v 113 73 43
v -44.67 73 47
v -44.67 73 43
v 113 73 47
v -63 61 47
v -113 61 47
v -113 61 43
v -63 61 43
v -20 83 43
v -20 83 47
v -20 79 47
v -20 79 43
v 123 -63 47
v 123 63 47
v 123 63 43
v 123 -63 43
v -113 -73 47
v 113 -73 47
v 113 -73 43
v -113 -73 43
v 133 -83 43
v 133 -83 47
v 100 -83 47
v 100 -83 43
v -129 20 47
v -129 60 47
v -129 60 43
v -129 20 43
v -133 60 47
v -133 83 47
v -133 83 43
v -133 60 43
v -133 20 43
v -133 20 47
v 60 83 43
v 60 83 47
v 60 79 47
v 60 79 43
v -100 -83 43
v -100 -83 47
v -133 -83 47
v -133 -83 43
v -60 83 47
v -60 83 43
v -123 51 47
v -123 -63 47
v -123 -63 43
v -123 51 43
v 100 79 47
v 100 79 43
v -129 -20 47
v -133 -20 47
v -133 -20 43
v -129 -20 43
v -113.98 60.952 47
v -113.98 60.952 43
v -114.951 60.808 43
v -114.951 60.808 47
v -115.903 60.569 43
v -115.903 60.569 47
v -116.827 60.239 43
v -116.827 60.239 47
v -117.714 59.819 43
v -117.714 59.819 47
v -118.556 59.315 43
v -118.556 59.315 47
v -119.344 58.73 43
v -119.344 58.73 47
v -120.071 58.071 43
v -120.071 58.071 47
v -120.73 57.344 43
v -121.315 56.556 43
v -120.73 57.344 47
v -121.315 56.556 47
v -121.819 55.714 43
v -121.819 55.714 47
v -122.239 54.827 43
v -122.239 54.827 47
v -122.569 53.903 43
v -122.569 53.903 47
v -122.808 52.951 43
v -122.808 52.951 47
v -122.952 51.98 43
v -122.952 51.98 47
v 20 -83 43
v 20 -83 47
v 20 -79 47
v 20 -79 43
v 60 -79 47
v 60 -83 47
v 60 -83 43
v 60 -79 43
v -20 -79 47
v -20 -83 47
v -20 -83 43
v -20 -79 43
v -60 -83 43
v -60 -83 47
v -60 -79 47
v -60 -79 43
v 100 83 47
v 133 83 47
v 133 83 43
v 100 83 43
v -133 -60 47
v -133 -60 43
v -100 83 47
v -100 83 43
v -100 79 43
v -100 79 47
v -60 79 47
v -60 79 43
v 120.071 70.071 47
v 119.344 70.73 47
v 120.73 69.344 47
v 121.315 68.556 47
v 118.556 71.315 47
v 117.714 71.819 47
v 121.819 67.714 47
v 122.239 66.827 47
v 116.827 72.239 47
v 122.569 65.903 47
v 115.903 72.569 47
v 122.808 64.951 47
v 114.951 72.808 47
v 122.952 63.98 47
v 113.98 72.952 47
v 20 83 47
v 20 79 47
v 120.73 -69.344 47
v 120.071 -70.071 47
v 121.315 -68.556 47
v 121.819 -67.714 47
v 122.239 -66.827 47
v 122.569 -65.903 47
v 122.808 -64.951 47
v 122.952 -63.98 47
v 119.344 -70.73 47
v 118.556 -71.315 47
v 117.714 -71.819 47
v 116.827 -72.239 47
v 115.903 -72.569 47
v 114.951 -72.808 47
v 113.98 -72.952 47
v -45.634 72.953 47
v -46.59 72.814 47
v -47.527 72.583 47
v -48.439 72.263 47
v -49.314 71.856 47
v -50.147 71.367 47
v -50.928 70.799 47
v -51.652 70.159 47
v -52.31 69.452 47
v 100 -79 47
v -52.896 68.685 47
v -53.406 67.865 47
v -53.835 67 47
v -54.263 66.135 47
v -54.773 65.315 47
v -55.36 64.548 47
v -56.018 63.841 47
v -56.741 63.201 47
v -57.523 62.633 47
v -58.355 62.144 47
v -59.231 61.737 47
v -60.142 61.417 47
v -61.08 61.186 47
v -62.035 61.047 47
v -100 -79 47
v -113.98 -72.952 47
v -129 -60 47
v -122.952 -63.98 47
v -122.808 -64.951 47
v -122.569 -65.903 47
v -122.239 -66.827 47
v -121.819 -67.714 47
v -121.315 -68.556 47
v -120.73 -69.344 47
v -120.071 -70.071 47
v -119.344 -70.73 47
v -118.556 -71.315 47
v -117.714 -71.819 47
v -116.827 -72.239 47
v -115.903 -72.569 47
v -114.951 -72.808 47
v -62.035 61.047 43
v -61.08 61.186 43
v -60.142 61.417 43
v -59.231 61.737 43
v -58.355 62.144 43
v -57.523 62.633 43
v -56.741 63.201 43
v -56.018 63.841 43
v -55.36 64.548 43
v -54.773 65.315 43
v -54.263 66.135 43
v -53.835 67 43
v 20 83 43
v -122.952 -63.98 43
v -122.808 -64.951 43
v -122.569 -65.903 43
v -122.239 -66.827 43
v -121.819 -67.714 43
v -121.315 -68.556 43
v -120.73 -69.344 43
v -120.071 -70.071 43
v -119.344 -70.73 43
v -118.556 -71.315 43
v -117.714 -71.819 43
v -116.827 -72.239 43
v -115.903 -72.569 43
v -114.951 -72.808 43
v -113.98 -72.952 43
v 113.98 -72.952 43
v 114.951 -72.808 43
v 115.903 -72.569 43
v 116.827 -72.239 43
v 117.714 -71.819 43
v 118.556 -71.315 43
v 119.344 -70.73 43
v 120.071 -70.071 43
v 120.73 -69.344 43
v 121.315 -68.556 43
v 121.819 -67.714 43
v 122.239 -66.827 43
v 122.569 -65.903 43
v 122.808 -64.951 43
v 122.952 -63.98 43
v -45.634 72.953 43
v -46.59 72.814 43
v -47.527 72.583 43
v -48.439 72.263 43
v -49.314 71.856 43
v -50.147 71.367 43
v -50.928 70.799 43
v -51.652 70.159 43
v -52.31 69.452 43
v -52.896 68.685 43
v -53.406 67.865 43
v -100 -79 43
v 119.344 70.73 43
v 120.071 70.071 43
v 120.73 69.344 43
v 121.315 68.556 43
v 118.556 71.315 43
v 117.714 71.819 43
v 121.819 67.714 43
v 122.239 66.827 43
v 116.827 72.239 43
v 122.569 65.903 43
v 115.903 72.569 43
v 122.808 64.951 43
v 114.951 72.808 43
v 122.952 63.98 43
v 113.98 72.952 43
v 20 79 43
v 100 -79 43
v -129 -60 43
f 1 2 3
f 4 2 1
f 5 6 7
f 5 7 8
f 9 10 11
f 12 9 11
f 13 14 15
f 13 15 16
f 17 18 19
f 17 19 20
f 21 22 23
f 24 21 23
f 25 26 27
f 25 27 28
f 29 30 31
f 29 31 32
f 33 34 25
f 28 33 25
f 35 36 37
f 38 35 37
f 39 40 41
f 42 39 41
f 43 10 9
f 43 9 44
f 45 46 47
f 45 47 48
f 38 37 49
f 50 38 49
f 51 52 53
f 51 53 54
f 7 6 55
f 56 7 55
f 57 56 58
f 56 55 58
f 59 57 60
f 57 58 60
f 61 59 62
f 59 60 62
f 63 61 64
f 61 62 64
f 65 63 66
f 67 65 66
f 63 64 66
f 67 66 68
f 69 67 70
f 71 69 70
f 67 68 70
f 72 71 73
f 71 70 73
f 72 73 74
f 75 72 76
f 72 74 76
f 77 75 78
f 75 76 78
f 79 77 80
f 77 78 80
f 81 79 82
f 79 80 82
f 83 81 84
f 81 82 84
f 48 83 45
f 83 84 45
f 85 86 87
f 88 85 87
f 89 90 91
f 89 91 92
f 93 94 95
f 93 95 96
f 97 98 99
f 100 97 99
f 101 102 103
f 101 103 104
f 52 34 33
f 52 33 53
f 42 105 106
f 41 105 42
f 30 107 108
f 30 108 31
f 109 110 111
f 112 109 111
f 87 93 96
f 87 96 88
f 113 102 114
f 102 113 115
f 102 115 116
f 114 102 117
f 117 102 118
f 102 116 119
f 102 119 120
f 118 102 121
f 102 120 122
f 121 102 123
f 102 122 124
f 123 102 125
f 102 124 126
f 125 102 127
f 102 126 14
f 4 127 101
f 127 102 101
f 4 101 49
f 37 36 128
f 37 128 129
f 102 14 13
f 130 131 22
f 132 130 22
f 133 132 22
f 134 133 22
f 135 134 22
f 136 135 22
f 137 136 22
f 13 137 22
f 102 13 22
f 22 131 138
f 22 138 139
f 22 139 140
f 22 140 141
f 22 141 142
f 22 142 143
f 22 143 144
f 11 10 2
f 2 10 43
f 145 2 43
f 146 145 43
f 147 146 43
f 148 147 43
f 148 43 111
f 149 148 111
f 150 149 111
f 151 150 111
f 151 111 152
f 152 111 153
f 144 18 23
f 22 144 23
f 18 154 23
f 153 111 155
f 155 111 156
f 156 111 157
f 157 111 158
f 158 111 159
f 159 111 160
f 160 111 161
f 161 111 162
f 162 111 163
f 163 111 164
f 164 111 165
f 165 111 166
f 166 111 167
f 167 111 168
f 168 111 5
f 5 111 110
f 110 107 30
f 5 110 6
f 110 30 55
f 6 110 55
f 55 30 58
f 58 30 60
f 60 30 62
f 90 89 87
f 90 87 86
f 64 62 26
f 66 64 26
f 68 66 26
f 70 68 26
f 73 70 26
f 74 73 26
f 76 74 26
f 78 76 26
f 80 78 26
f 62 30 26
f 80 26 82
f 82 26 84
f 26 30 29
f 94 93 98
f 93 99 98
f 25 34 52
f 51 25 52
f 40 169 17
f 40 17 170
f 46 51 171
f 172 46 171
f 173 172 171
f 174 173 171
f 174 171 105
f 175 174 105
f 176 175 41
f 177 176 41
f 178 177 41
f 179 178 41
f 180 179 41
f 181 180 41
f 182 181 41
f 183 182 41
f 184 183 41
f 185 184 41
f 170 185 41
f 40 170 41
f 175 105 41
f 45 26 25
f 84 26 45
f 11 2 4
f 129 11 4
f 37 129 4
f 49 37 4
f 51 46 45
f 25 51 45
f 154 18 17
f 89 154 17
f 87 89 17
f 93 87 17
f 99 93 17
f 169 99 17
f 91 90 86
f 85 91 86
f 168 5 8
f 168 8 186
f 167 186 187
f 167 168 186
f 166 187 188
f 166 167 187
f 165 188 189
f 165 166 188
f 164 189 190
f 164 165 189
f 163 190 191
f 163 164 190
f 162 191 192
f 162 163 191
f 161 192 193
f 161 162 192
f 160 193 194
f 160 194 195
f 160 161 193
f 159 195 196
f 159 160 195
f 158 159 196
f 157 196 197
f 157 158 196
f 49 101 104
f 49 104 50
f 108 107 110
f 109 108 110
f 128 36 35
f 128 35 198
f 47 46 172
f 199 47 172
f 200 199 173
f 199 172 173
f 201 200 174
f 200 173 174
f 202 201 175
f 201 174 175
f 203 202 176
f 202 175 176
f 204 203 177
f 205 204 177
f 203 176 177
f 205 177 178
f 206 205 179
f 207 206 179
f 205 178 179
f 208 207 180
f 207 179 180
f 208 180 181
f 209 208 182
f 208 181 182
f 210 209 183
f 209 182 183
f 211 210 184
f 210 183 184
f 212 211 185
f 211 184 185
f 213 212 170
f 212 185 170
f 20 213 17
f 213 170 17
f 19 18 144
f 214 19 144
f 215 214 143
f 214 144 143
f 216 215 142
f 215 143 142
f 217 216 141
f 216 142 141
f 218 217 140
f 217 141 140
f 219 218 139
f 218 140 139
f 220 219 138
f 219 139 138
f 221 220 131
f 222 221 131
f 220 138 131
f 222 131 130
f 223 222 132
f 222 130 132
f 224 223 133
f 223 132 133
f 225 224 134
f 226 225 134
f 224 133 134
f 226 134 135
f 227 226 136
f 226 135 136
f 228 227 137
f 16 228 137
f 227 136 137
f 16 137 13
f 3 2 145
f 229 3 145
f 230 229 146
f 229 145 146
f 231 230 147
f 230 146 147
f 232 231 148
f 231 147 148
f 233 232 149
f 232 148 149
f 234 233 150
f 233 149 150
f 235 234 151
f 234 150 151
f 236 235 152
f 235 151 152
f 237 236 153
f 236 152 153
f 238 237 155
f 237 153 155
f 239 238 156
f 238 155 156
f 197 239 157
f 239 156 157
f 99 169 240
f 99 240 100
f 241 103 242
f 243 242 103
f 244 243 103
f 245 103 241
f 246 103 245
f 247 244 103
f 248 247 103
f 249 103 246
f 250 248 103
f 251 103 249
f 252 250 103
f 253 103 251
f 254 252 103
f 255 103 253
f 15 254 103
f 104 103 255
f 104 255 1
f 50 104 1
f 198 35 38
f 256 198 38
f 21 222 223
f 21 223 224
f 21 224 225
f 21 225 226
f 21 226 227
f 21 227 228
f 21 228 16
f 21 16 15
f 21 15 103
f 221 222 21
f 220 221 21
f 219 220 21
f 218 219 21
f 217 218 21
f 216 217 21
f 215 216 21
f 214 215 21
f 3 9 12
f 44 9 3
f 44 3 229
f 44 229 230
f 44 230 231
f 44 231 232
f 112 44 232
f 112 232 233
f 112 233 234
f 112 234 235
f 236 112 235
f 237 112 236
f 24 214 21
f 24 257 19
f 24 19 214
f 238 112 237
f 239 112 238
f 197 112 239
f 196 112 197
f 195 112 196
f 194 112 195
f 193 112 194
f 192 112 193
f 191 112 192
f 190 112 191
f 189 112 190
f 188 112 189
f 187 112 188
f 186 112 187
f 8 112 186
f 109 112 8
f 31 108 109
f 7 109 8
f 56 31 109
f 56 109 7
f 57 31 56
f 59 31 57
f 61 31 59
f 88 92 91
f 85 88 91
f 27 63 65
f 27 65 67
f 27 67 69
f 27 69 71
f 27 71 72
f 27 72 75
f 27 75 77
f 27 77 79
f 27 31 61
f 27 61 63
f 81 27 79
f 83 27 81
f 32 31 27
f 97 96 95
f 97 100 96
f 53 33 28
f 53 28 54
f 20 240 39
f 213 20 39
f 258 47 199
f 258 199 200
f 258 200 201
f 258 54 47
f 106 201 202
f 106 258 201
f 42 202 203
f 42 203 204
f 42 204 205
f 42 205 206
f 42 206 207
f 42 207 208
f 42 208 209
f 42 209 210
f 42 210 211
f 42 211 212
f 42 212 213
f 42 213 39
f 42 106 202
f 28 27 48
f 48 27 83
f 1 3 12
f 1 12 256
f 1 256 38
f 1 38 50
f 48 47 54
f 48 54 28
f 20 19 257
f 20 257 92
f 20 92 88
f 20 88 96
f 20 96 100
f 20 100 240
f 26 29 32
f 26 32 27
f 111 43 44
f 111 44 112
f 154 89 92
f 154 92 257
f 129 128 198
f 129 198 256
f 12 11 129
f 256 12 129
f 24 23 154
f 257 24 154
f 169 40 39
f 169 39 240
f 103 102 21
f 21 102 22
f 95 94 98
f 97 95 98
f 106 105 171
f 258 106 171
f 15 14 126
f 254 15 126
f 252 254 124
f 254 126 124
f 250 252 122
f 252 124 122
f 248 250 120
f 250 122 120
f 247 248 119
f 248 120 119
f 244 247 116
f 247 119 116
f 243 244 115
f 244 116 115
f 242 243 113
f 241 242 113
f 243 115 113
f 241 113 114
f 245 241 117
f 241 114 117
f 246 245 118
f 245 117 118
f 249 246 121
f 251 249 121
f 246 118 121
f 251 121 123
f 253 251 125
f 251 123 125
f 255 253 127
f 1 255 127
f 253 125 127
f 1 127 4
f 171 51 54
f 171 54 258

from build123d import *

# Parameters (mm, degrees)
SKETCH013_W     = 166
SKETCH013_H     = 266
PAD010_DEPTH    = 4
SKETCH017_W     = 26
SKETCH017_H     = 40
POCKET002_DEPTH = 631.146916
SKETCH018_W     = 40
SKETCH018_H     = 30
POCKET003_DEPTH = 4.001
POCKET012_DEPTH = 4.001


with BuildPart() as part:
    # Sketch013 (on DatumPlane) → Pad010 (new body)
    with BuildSketch(Plane(origin=(-31.154728, 0, 47), x_dir=(0, -1, 0), z_dir=(0, 0, -1))):
        with Locations((0, -31.154728)):
            Rectangle(SKETCH013_W, SKETCH013_H)
    extrude(amount=PAD010_DEPTH)

    # Sketch017 (on Face5 of Pad010) → Pocket002 (cut, through all)
    with BuildSketch(Plane(origin=(-31.154728, 0, 47), x_dir=(0, -1, 0), z_dir=(0, 0, 1))):
        with Locations((-92, 111.154728)):
            Rectangle(SKETCH017_W, SKETCH017_H)
        with Locations((-92, 31.154728)):
            Rectangle(SKETCH017_W, SKETCH017_H)
        with Locations((-92, -48.845272)):
            Rectangle(SKETCH017_W, SKETCH017_H)
    pocket002 = extrude(amount=-POCKET002_DEPTH, mode=Mode.SUBTRACT)

    # Mirrored004: Pocket002 across Sketch017 V_Axis
    add(pocket002.mirror(Plane(origin=(-31.154728, 0, 47), x_dir=(0, 0, 1), z_dir=(0, -1, 0))), mode=Mode.SUBTRACT)

    # Sketch018 (on Face4 of Mirrored004) → Pocket003 (cut, through all)
    with BuildSketch(Plane(origin=(-31.154728, 0, 47), x_dir=(0, -1, 0), z_dir=(0, 0, 1))):
        with Locations((-40, -112.845272)):
            Rectangle(SKETCH018_W, SKETCH018_H)
        with Locations((40, -112.845272)):
            Rectangle(SKETCH018_W, SKETCH018_H)
    extrude(amount=-POCKET003_DEPTH, mode=Mode.SUBTRACT)

    # Sketch029 (on Face2 of Pocket003) → Pocket012 (cut, through all)
    with BuildSketch(Plane(origin=(-31.154728, 0, 47), x_dir=(0, -1, 0), z_dir=(0, 0, 1))):
        with BuildLine():
            Line((-63, 154.154728), (63, 154.154728))
            ThreePointArc((73, 144.154728), (70.071068, 151.225796), (63, 154.154728))
            Line((73, 144.154728), (73, -81.845272))
            ThreePointArc((63, -91.845272), (70.071068, -88.91634), (73, -81.845272))
            Line((63, -91.845272), (-51, -91.845272))
            ThreePointArc((-61, -81.845272), (-58.071068, -88.91634), (-51, -91.845272))
            Line((-61, -81.845272), (-61, -31.845272))
            ThreePointArc((-61, -31.845272), (-62.6334, -26.368047), (-67, -22.680121))
            ThreePointArc((-73, -13.514969), (-71.3666, -18.992195), (-67, -22.680121))
            Line((-73, -13.514969), (-73, 144.154728))
            ThreePointArc((-63, 154.154728), (-70.071068, 151.225796), (-73, 144.154728))
        make_face()
    extrude(amount=-POCKET012_DEPTH, mode=Mode.SUBTRACT)


solid = part.part
